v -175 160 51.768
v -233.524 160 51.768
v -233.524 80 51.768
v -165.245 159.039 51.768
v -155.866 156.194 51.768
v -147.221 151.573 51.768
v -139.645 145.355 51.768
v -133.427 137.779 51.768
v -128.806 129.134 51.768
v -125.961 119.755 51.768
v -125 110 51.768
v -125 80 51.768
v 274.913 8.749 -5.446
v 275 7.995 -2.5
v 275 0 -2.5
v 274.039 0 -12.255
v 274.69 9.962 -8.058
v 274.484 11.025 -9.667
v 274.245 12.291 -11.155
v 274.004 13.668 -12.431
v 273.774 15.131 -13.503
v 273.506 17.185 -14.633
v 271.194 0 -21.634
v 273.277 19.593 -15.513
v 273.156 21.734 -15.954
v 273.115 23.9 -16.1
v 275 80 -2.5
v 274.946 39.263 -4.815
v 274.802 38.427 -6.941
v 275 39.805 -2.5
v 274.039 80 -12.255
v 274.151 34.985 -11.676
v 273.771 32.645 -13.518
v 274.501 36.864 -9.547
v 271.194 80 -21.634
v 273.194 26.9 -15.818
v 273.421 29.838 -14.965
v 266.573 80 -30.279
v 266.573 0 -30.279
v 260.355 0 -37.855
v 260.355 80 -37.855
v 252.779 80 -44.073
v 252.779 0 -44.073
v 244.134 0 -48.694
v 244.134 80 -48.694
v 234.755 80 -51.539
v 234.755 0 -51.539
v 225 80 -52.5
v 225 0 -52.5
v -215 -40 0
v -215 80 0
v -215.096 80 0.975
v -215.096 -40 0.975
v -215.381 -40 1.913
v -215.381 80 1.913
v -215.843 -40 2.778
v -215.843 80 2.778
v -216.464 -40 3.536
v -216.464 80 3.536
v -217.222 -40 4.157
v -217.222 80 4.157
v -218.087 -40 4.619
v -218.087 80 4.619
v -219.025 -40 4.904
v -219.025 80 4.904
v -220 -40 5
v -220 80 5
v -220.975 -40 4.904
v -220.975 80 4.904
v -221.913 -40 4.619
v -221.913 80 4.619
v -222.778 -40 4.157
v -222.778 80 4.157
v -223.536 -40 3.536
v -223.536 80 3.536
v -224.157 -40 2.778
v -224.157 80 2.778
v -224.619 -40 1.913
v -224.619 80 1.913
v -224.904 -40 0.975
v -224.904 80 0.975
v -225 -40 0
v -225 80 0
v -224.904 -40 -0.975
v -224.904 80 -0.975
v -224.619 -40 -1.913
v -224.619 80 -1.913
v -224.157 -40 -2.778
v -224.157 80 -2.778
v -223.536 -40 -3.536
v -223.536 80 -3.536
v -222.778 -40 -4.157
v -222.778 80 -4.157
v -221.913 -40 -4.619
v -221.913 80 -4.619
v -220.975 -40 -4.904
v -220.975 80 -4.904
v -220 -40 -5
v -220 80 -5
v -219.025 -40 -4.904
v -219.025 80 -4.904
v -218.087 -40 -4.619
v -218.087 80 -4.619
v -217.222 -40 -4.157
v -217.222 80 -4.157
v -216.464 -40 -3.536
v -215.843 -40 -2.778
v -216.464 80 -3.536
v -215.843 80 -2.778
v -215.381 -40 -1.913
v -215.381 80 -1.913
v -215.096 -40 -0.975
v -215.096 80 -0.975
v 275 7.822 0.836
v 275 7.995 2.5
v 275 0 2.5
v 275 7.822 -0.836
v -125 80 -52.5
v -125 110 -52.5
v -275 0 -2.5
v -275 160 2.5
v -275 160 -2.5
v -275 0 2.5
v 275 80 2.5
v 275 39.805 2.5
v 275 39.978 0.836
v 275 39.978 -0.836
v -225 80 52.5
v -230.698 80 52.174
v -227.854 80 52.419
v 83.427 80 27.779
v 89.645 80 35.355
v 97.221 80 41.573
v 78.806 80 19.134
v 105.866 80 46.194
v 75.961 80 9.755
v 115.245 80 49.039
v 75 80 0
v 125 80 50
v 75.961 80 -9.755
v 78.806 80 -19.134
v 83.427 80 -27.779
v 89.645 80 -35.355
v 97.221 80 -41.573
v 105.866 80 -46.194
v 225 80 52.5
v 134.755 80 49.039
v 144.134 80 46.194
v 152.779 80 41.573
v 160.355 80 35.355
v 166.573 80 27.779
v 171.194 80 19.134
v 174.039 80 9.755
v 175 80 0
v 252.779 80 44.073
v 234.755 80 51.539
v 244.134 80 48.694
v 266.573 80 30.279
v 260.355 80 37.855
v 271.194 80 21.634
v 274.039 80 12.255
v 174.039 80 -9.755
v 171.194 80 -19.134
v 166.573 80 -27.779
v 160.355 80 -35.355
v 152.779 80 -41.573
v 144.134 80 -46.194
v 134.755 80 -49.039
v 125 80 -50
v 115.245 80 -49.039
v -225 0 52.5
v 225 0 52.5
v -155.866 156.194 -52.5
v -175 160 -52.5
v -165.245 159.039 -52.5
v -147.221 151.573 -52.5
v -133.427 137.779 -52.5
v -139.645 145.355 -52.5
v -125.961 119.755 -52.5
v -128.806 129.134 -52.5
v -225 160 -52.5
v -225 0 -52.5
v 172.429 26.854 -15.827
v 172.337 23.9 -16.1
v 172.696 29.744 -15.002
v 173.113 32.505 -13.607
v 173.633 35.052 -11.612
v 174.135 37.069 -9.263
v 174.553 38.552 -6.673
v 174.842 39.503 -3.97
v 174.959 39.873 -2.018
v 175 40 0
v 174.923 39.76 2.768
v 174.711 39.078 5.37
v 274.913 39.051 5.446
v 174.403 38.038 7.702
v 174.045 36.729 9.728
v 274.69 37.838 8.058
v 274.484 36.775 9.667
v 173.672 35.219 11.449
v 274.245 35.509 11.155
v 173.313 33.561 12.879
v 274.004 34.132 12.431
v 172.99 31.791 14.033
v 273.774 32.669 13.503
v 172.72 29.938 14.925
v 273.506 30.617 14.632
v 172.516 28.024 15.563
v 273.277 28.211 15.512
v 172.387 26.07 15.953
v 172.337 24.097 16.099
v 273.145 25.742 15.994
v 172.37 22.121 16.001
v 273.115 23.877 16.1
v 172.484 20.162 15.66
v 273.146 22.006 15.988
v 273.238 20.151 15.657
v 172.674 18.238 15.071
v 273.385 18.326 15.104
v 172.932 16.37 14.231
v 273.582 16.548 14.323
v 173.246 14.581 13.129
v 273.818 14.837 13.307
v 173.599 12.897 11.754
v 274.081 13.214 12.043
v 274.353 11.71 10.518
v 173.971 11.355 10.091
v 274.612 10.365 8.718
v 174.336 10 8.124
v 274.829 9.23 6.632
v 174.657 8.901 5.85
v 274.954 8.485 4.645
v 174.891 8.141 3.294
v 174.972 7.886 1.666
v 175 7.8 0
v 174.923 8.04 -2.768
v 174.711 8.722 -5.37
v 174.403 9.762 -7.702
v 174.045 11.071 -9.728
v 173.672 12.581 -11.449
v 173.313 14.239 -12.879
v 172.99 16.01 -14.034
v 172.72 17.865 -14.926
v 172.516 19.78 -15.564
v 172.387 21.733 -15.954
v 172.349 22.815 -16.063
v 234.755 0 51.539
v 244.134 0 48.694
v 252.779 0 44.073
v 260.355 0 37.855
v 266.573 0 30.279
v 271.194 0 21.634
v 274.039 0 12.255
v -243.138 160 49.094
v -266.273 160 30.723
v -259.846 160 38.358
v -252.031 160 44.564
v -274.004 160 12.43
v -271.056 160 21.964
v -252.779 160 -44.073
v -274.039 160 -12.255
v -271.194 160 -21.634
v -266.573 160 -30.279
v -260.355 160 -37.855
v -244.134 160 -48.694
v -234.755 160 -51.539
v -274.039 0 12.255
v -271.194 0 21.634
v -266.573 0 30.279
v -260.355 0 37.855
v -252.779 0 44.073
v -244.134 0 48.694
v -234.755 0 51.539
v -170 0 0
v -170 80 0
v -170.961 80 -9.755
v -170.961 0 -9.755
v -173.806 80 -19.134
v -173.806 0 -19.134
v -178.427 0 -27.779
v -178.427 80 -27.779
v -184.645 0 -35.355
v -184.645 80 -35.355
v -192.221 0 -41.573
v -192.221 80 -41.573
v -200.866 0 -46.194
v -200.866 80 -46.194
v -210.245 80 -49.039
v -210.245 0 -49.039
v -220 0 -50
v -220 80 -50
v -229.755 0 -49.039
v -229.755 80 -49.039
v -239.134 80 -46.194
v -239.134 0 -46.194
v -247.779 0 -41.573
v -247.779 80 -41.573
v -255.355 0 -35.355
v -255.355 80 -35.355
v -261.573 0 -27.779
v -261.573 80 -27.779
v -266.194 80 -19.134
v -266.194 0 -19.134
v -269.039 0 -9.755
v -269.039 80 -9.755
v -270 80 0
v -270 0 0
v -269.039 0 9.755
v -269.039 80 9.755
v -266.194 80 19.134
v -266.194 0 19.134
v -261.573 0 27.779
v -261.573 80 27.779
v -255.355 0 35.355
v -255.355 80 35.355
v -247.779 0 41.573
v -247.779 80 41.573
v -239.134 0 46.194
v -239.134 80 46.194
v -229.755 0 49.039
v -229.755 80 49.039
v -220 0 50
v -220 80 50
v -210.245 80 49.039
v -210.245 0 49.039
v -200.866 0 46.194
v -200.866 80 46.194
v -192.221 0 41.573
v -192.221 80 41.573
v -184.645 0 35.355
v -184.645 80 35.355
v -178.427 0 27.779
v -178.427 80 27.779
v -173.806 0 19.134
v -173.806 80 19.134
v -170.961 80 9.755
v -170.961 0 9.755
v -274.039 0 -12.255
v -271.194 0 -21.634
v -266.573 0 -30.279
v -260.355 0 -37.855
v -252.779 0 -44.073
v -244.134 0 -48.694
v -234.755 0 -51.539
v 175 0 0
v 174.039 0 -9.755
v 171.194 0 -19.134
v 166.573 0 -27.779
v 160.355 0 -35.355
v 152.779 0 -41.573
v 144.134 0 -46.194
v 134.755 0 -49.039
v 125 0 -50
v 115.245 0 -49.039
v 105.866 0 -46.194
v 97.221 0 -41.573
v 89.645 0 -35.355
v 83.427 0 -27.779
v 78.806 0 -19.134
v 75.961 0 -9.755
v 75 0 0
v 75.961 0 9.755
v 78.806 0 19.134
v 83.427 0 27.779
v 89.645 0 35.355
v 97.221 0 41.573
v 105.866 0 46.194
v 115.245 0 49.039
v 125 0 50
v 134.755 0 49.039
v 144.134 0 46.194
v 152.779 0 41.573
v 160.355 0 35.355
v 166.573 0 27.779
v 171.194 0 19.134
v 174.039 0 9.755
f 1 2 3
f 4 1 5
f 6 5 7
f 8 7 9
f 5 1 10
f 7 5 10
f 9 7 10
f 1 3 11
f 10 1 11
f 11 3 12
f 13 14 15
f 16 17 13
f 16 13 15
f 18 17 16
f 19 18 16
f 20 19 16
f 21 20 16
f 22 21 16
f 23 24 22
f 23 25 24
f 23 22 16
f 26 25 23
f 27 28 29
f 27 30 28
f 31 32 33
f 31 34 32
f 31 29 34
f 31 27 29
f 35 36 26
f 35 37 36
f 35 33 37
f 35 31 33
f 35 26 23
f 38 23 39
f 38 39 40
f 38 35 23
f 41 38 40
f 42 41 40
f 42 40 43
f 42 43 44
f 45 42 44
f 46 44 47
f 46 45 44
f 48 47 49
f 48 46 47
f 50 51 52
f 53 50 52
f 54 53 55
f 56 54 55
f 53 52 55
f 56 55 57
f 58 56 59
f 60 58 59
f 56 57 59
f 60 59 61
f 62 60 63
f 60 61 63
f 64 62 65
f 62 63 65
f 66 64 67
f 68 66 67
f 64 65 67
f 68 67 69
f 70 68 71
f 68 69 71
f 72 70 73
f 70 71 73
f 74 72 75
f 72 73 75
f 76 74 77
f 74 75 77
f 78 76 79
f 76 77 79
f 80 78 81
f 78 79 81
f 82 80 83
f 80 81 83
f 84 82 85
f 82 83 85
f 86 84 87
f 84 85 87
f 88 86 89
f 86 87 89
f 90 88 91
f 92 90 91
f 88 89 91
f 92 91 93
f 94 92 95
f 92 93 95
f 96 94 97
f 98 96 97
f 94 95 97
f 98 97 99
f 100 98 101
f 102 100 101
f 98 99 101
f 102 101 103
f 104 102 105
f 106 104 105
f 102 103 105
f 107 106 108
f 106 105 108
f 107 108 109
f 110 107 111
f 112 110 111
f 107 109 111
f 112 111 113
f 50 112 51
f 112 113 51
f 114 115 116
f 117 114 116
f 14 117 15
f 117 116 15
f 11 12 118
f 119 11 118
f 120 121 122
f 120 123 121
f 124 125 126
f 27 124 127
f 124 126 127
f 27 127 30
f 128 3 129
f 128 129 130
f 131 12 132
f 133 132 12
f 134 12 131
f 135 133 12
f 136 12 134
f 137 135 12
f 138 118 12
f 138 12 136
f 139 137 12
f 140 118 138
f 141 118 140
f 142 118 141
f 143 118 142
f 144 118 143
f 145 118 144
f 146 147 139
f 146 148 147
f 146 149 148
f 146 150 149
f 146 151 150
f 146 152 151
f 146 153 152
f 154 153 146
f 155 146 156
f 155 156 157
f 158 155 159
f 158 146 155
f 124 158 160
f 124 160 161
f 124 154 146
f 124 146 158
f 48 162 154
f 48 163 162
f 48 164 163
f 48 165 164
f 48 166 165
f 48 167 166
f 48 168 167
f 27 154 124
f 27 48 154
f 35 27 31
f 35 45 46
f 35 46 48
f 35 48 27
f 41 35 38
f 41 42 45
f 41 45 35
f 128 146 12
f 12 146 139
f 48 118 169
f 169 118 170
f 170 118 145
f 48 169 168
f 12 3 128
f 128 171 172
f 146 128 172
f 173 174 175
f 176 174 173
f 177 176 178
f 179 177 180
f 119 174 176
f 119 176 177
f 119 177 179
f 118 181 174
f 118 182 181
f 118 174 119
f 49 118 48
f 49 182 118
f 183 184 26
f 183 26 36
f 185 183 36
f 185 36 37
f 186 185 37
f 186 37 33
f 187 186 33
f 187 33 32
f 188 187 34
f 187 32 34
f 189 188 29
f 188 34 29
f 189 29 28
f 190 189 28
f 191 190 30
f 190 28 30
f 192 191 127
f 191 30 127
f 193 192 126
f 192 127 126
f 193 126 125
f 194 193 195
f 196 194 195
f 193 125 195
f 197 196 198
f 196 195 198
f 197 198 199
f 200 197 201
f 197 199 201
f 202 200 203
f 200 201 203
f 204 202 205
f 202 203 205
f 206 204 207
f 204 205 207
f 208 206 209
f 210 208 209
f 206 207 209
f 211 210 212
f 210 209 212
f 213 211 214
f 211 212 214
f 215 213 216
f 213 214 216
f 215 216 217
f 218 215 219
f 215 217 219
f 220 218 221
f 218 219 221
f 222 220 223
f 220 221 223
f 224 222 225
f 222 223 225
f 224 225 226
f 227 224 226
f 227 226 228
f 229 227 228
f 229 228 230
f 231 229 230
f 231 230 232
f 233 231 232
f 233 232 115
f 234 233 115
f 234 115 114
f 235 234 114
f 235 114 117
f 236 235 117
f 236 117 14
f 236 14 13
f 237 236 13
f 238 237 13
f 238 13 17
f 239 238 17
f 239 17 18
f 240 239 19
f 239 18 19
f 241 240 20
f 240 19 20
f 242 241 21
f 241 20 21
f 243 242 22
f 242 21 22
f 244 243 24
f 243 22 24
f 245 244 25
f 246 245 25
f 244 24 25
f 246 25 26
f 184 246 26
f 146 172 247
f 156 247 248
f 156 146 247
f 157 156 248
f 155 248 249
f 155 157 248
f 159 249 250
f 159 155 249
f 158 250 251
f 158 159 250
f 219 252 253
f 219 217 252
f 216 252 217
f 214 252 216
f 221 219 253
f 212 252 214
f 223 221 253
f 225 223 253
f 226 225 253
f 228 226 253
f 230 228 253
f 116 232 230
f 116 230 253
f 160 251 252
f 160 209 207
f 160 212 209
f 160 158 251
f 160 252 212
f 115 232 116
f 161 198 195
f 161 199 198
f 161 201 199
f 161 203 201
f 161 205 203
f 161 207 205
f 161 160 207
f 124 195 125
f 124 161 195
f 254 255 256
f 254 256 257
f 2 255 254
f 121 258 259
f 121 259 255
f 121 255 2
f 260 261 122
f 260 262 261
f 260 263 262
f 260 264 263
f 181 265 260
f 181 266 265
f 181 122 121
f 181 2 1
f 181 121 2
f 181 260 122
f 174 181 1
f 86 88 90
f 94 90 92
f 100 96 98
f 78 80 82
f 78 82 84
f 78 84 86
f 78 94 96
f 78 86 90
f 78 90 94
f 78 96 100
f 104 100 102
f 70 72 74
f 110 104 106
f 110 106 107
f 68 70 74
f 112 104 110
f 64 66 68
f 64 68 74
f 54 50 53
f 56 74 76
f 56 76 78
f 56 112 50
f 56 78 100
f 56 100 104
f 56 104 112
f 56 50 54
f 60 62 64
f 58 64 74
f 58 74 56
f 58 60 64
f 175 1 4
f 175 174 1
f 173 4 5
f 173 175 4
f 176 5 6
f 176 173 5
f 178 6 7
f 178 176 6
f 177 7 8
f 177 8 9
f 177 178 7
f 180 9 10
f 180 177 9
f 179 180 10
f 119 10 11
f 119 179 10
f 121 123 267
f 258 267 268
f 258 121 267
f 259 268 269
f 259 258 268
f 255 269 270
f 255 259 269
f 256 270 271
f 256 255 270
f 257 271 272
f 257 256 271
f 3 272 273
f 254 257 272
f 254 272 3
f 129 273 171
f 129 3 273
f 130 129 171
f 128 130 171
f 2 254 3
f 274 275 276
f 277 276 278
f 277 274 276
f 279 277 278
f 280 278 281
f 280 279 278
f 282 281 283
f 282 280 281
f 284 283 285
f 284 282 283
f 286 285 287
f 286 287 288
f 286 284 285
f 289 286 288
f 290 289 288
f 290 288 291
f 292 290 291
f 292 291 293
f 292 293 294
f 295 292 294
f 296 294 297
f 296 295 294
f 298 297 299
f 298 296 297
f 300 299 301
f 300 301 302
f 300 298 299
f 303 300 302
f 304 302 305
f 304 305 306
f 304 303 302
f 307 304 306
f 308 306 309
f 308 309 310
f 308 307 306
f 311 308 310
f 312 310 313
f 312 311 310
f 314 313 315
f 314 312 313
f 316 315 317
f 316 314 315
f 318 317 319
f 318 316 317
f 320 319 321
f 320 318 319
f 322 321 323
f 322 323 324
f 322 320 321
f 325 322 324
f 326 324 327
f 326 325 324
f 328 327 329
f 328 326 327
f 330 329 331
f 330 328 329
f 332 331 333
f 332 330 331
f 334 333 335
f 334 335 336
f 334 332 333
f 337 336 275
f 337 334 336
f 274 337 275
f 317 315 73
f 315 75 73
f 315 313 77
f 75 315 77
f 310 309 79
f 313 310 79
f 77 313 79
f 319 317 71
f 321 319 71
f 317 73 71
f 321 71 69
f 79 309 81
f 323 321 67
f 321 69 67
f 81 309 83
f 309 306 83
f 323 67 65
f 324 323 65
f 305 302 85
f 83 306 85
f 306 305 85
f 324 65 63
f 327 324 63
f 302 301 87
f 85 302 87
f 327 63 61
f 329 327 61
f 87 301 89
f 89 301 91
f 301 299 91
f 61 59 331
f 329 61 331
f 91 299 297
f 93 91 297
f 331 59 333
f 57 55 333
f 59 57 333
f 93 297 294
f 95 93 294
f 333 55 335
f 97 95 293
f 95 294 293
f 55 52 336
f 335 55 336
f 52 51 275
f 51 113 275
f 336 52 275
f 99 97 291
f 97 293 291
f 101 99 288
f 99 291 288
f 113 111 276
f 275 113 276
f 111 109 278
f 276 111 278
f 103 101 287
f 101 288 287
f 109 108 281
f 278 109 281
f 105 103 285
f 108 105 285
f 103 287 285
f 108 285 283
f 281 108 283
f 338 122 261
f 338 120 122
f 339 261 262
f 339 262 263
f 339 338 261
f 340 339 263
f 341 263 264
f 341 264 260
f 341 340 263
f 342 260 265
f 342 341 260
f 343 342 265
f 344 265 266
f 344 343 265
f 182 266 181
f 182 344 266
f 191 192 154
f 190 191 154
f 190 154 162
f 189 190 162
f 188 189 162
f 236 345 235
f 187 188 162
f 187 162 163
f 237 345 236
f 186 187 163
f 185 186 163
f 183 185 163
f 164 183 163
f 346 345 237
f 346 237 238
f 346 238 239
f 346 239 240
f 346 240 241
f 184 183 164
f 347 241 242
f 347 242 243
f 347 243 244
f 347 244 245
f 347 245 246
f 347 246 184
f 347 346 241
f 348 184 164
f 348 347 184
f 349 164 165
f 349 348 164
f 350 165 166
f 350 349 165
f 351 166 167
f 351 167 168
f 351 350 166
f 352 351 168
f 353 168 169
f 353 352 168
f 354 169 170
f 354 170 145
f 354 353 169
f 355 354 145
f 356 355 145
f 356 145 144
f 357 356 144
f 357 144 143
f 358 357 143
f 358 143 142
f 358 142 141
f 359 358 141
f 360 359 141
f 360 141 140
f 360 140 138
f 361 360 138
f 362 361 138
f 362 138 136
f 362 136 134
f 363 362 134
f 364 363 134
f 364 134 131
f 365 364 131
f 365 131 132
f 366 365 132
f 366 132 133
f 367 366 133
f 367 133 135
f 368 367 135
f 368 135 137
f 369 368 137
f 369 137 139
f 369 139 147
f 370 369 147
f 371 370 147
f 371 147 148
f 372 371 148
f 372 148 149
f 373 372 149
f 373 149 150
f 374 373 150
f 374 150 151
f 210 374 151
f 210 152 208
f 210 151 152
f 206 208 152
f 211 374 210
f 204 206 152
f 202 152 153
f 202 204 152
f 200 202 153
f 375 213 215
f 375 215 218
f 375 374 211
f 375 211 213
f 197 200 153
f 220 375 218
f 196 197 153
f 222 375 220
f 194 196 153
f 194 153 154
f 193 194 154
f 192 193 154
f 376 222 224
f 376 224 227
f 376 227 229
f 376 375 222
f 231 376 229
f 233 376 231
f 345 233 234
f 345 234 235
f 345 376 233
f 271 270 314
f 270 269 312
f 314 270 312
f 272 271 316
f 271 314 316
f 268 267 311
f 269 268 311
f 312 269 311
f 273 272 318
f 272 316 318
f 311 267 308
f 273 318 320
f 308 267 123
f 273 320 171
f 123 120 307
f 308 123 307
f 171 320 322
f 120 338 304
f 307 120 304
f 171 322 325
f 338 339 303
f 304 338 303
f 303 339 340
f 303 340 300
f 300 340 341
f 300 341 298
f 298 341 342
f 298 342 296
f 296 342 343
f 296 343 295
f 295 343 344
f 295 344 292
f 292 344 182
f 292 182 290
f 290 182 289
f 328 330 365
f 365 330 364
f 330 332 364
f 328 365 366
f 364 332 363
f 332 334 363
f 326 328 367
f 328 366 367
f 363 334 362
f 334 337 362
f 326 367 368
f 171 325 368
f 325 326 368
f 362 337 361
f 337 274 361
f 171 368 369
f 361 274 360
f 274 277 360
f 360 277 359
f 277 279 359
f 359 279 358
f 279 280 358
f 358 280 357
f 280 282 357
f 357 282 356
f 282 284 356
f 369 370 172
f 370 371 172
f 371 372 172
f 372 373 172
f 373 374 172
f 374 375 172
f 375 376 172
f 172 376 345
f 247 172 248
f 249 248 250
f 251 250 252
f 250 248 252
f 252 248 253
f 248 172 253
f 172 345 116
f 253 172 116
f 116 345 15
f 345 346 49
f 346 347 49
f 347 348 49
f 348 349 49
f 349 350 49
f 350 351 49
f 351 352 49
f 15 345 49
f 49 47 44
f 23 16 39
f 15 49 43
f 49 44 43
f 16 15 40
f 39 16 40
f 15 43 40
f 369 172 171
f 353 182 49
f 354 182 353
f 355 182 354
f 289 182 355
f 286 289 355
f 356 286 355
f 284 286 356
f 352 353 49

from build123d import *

# Parameters (mm, degrees)
SKETCH1_W           = 550
SKETCH1_H           = 105
SKETCH1_R           = 50
BOSS_EXTRUDE2_DEPTH = 80
FILLET4_R           = 50
FILLET5_R           = 50
SKETCH11_W          = 150
SKETCH11_H          = 104.268109322
BOSS_EXTRUDE3_DEPTH = 80
SKETCH12_R          = 5
BOSS_EXTRUDE4_DEPTH = 120
FILLET8_R           = 50
FILLET9_R           = 50
FILLET10_R          = 50
SKETCH13_R          = 16.1
CUT_EXTRUDE1_DEPTH  = 150


with BuildPart() as part:
    # Sketch1 → Boss-Extrude2 (new body)
    with BuildSketch(Plane(origin=(0, 0, 0), x_dir=(1, 0, 0), z_dir=(0, 1, 0))):
        Rectangle(SKETCH1_W, SKETCH1_H)
        with Locations((-220, 0)):
            Circle(SKETCH1_R, mode=Mode.SUBTRACT)
        with Locations((125, 0)):
            Circle(SKETCH1_R, mode=Mode.SUBTRACT)
    extrude(amount=BOSS_EXTRUDE2_DEPTH)

    # Fillet4
    fillet4_edges = [part.edges().sort_by_distance(p)[0] for p in [
        (275, 40, 52.5),
    ]]
    fillet(fillet4_edges, radius=FILLET4_R)

    # Fillet5
    fillet5_edges = [part.edges().sort_by_distance(p)[0] for p in [
        (275, 40, -52.5),
    ]]
    fillet(fillet5_edges, radius=FILLET5_R)

    # Sketch11 → Boss-Extrude3 (add)
    with BuildSketch(Plane(origin=(0, 80, 0), x_dir=(1, 0, 0), z_dir=(0, 1, 0))):
        with Locations((-200, 0.365945339)):
            Rectangle(SKETCH11_W, SKETCH11_H)
    extrude(amount=BOSS_EXTRUDE3_DEPTH)

    # Sketch12 → Boss-Extrude4 (add)
    with BuildSketch(Plane.XZ.offset(-80)):
        with Locations((-220, 0)):
            Circle(SKETCH12_R)
    extrude(amount=BOSS_EXTRUDE4_DEPTH)

    # Fillet8
    fillet8_edges = [part.edges().sort_by_distance(p)[0] for p in [
        (-275, 40, 52.5),
    ]]
    fillet(fillet8_edges, radius=FILLET8_R)

    # Fillet9
    fillet9_edges = [part.edges().sort_by_distance(p)[0] for p in [
        (-275, 80, -52.5),
    ]]
    fillet(fillet9_edges, radius=FILLET9_R)

    # Fillet10
    fillet10_edges = [part.edges().sort_by_distance(p)[0] for p in [
        (-125, 160, -0.365945339),
    ]]
    fillet(fillet10_edges, radius=FILLET10_R)

    # Sketch13 → Cut-Extrude1 (cut)
    with BuildSketch(Plane(origin=(275, 0, 0), x_dir=(0, 0, -1), z_dir=(1, 0, 0))):
        with Locations((0, 23.9)):
            Circle(SKETCH13_R)
    extrude(amount=-CUT_EXTRUDE1_DEPTH, mode=Mode.SUBTRACT)


solid = part.part
